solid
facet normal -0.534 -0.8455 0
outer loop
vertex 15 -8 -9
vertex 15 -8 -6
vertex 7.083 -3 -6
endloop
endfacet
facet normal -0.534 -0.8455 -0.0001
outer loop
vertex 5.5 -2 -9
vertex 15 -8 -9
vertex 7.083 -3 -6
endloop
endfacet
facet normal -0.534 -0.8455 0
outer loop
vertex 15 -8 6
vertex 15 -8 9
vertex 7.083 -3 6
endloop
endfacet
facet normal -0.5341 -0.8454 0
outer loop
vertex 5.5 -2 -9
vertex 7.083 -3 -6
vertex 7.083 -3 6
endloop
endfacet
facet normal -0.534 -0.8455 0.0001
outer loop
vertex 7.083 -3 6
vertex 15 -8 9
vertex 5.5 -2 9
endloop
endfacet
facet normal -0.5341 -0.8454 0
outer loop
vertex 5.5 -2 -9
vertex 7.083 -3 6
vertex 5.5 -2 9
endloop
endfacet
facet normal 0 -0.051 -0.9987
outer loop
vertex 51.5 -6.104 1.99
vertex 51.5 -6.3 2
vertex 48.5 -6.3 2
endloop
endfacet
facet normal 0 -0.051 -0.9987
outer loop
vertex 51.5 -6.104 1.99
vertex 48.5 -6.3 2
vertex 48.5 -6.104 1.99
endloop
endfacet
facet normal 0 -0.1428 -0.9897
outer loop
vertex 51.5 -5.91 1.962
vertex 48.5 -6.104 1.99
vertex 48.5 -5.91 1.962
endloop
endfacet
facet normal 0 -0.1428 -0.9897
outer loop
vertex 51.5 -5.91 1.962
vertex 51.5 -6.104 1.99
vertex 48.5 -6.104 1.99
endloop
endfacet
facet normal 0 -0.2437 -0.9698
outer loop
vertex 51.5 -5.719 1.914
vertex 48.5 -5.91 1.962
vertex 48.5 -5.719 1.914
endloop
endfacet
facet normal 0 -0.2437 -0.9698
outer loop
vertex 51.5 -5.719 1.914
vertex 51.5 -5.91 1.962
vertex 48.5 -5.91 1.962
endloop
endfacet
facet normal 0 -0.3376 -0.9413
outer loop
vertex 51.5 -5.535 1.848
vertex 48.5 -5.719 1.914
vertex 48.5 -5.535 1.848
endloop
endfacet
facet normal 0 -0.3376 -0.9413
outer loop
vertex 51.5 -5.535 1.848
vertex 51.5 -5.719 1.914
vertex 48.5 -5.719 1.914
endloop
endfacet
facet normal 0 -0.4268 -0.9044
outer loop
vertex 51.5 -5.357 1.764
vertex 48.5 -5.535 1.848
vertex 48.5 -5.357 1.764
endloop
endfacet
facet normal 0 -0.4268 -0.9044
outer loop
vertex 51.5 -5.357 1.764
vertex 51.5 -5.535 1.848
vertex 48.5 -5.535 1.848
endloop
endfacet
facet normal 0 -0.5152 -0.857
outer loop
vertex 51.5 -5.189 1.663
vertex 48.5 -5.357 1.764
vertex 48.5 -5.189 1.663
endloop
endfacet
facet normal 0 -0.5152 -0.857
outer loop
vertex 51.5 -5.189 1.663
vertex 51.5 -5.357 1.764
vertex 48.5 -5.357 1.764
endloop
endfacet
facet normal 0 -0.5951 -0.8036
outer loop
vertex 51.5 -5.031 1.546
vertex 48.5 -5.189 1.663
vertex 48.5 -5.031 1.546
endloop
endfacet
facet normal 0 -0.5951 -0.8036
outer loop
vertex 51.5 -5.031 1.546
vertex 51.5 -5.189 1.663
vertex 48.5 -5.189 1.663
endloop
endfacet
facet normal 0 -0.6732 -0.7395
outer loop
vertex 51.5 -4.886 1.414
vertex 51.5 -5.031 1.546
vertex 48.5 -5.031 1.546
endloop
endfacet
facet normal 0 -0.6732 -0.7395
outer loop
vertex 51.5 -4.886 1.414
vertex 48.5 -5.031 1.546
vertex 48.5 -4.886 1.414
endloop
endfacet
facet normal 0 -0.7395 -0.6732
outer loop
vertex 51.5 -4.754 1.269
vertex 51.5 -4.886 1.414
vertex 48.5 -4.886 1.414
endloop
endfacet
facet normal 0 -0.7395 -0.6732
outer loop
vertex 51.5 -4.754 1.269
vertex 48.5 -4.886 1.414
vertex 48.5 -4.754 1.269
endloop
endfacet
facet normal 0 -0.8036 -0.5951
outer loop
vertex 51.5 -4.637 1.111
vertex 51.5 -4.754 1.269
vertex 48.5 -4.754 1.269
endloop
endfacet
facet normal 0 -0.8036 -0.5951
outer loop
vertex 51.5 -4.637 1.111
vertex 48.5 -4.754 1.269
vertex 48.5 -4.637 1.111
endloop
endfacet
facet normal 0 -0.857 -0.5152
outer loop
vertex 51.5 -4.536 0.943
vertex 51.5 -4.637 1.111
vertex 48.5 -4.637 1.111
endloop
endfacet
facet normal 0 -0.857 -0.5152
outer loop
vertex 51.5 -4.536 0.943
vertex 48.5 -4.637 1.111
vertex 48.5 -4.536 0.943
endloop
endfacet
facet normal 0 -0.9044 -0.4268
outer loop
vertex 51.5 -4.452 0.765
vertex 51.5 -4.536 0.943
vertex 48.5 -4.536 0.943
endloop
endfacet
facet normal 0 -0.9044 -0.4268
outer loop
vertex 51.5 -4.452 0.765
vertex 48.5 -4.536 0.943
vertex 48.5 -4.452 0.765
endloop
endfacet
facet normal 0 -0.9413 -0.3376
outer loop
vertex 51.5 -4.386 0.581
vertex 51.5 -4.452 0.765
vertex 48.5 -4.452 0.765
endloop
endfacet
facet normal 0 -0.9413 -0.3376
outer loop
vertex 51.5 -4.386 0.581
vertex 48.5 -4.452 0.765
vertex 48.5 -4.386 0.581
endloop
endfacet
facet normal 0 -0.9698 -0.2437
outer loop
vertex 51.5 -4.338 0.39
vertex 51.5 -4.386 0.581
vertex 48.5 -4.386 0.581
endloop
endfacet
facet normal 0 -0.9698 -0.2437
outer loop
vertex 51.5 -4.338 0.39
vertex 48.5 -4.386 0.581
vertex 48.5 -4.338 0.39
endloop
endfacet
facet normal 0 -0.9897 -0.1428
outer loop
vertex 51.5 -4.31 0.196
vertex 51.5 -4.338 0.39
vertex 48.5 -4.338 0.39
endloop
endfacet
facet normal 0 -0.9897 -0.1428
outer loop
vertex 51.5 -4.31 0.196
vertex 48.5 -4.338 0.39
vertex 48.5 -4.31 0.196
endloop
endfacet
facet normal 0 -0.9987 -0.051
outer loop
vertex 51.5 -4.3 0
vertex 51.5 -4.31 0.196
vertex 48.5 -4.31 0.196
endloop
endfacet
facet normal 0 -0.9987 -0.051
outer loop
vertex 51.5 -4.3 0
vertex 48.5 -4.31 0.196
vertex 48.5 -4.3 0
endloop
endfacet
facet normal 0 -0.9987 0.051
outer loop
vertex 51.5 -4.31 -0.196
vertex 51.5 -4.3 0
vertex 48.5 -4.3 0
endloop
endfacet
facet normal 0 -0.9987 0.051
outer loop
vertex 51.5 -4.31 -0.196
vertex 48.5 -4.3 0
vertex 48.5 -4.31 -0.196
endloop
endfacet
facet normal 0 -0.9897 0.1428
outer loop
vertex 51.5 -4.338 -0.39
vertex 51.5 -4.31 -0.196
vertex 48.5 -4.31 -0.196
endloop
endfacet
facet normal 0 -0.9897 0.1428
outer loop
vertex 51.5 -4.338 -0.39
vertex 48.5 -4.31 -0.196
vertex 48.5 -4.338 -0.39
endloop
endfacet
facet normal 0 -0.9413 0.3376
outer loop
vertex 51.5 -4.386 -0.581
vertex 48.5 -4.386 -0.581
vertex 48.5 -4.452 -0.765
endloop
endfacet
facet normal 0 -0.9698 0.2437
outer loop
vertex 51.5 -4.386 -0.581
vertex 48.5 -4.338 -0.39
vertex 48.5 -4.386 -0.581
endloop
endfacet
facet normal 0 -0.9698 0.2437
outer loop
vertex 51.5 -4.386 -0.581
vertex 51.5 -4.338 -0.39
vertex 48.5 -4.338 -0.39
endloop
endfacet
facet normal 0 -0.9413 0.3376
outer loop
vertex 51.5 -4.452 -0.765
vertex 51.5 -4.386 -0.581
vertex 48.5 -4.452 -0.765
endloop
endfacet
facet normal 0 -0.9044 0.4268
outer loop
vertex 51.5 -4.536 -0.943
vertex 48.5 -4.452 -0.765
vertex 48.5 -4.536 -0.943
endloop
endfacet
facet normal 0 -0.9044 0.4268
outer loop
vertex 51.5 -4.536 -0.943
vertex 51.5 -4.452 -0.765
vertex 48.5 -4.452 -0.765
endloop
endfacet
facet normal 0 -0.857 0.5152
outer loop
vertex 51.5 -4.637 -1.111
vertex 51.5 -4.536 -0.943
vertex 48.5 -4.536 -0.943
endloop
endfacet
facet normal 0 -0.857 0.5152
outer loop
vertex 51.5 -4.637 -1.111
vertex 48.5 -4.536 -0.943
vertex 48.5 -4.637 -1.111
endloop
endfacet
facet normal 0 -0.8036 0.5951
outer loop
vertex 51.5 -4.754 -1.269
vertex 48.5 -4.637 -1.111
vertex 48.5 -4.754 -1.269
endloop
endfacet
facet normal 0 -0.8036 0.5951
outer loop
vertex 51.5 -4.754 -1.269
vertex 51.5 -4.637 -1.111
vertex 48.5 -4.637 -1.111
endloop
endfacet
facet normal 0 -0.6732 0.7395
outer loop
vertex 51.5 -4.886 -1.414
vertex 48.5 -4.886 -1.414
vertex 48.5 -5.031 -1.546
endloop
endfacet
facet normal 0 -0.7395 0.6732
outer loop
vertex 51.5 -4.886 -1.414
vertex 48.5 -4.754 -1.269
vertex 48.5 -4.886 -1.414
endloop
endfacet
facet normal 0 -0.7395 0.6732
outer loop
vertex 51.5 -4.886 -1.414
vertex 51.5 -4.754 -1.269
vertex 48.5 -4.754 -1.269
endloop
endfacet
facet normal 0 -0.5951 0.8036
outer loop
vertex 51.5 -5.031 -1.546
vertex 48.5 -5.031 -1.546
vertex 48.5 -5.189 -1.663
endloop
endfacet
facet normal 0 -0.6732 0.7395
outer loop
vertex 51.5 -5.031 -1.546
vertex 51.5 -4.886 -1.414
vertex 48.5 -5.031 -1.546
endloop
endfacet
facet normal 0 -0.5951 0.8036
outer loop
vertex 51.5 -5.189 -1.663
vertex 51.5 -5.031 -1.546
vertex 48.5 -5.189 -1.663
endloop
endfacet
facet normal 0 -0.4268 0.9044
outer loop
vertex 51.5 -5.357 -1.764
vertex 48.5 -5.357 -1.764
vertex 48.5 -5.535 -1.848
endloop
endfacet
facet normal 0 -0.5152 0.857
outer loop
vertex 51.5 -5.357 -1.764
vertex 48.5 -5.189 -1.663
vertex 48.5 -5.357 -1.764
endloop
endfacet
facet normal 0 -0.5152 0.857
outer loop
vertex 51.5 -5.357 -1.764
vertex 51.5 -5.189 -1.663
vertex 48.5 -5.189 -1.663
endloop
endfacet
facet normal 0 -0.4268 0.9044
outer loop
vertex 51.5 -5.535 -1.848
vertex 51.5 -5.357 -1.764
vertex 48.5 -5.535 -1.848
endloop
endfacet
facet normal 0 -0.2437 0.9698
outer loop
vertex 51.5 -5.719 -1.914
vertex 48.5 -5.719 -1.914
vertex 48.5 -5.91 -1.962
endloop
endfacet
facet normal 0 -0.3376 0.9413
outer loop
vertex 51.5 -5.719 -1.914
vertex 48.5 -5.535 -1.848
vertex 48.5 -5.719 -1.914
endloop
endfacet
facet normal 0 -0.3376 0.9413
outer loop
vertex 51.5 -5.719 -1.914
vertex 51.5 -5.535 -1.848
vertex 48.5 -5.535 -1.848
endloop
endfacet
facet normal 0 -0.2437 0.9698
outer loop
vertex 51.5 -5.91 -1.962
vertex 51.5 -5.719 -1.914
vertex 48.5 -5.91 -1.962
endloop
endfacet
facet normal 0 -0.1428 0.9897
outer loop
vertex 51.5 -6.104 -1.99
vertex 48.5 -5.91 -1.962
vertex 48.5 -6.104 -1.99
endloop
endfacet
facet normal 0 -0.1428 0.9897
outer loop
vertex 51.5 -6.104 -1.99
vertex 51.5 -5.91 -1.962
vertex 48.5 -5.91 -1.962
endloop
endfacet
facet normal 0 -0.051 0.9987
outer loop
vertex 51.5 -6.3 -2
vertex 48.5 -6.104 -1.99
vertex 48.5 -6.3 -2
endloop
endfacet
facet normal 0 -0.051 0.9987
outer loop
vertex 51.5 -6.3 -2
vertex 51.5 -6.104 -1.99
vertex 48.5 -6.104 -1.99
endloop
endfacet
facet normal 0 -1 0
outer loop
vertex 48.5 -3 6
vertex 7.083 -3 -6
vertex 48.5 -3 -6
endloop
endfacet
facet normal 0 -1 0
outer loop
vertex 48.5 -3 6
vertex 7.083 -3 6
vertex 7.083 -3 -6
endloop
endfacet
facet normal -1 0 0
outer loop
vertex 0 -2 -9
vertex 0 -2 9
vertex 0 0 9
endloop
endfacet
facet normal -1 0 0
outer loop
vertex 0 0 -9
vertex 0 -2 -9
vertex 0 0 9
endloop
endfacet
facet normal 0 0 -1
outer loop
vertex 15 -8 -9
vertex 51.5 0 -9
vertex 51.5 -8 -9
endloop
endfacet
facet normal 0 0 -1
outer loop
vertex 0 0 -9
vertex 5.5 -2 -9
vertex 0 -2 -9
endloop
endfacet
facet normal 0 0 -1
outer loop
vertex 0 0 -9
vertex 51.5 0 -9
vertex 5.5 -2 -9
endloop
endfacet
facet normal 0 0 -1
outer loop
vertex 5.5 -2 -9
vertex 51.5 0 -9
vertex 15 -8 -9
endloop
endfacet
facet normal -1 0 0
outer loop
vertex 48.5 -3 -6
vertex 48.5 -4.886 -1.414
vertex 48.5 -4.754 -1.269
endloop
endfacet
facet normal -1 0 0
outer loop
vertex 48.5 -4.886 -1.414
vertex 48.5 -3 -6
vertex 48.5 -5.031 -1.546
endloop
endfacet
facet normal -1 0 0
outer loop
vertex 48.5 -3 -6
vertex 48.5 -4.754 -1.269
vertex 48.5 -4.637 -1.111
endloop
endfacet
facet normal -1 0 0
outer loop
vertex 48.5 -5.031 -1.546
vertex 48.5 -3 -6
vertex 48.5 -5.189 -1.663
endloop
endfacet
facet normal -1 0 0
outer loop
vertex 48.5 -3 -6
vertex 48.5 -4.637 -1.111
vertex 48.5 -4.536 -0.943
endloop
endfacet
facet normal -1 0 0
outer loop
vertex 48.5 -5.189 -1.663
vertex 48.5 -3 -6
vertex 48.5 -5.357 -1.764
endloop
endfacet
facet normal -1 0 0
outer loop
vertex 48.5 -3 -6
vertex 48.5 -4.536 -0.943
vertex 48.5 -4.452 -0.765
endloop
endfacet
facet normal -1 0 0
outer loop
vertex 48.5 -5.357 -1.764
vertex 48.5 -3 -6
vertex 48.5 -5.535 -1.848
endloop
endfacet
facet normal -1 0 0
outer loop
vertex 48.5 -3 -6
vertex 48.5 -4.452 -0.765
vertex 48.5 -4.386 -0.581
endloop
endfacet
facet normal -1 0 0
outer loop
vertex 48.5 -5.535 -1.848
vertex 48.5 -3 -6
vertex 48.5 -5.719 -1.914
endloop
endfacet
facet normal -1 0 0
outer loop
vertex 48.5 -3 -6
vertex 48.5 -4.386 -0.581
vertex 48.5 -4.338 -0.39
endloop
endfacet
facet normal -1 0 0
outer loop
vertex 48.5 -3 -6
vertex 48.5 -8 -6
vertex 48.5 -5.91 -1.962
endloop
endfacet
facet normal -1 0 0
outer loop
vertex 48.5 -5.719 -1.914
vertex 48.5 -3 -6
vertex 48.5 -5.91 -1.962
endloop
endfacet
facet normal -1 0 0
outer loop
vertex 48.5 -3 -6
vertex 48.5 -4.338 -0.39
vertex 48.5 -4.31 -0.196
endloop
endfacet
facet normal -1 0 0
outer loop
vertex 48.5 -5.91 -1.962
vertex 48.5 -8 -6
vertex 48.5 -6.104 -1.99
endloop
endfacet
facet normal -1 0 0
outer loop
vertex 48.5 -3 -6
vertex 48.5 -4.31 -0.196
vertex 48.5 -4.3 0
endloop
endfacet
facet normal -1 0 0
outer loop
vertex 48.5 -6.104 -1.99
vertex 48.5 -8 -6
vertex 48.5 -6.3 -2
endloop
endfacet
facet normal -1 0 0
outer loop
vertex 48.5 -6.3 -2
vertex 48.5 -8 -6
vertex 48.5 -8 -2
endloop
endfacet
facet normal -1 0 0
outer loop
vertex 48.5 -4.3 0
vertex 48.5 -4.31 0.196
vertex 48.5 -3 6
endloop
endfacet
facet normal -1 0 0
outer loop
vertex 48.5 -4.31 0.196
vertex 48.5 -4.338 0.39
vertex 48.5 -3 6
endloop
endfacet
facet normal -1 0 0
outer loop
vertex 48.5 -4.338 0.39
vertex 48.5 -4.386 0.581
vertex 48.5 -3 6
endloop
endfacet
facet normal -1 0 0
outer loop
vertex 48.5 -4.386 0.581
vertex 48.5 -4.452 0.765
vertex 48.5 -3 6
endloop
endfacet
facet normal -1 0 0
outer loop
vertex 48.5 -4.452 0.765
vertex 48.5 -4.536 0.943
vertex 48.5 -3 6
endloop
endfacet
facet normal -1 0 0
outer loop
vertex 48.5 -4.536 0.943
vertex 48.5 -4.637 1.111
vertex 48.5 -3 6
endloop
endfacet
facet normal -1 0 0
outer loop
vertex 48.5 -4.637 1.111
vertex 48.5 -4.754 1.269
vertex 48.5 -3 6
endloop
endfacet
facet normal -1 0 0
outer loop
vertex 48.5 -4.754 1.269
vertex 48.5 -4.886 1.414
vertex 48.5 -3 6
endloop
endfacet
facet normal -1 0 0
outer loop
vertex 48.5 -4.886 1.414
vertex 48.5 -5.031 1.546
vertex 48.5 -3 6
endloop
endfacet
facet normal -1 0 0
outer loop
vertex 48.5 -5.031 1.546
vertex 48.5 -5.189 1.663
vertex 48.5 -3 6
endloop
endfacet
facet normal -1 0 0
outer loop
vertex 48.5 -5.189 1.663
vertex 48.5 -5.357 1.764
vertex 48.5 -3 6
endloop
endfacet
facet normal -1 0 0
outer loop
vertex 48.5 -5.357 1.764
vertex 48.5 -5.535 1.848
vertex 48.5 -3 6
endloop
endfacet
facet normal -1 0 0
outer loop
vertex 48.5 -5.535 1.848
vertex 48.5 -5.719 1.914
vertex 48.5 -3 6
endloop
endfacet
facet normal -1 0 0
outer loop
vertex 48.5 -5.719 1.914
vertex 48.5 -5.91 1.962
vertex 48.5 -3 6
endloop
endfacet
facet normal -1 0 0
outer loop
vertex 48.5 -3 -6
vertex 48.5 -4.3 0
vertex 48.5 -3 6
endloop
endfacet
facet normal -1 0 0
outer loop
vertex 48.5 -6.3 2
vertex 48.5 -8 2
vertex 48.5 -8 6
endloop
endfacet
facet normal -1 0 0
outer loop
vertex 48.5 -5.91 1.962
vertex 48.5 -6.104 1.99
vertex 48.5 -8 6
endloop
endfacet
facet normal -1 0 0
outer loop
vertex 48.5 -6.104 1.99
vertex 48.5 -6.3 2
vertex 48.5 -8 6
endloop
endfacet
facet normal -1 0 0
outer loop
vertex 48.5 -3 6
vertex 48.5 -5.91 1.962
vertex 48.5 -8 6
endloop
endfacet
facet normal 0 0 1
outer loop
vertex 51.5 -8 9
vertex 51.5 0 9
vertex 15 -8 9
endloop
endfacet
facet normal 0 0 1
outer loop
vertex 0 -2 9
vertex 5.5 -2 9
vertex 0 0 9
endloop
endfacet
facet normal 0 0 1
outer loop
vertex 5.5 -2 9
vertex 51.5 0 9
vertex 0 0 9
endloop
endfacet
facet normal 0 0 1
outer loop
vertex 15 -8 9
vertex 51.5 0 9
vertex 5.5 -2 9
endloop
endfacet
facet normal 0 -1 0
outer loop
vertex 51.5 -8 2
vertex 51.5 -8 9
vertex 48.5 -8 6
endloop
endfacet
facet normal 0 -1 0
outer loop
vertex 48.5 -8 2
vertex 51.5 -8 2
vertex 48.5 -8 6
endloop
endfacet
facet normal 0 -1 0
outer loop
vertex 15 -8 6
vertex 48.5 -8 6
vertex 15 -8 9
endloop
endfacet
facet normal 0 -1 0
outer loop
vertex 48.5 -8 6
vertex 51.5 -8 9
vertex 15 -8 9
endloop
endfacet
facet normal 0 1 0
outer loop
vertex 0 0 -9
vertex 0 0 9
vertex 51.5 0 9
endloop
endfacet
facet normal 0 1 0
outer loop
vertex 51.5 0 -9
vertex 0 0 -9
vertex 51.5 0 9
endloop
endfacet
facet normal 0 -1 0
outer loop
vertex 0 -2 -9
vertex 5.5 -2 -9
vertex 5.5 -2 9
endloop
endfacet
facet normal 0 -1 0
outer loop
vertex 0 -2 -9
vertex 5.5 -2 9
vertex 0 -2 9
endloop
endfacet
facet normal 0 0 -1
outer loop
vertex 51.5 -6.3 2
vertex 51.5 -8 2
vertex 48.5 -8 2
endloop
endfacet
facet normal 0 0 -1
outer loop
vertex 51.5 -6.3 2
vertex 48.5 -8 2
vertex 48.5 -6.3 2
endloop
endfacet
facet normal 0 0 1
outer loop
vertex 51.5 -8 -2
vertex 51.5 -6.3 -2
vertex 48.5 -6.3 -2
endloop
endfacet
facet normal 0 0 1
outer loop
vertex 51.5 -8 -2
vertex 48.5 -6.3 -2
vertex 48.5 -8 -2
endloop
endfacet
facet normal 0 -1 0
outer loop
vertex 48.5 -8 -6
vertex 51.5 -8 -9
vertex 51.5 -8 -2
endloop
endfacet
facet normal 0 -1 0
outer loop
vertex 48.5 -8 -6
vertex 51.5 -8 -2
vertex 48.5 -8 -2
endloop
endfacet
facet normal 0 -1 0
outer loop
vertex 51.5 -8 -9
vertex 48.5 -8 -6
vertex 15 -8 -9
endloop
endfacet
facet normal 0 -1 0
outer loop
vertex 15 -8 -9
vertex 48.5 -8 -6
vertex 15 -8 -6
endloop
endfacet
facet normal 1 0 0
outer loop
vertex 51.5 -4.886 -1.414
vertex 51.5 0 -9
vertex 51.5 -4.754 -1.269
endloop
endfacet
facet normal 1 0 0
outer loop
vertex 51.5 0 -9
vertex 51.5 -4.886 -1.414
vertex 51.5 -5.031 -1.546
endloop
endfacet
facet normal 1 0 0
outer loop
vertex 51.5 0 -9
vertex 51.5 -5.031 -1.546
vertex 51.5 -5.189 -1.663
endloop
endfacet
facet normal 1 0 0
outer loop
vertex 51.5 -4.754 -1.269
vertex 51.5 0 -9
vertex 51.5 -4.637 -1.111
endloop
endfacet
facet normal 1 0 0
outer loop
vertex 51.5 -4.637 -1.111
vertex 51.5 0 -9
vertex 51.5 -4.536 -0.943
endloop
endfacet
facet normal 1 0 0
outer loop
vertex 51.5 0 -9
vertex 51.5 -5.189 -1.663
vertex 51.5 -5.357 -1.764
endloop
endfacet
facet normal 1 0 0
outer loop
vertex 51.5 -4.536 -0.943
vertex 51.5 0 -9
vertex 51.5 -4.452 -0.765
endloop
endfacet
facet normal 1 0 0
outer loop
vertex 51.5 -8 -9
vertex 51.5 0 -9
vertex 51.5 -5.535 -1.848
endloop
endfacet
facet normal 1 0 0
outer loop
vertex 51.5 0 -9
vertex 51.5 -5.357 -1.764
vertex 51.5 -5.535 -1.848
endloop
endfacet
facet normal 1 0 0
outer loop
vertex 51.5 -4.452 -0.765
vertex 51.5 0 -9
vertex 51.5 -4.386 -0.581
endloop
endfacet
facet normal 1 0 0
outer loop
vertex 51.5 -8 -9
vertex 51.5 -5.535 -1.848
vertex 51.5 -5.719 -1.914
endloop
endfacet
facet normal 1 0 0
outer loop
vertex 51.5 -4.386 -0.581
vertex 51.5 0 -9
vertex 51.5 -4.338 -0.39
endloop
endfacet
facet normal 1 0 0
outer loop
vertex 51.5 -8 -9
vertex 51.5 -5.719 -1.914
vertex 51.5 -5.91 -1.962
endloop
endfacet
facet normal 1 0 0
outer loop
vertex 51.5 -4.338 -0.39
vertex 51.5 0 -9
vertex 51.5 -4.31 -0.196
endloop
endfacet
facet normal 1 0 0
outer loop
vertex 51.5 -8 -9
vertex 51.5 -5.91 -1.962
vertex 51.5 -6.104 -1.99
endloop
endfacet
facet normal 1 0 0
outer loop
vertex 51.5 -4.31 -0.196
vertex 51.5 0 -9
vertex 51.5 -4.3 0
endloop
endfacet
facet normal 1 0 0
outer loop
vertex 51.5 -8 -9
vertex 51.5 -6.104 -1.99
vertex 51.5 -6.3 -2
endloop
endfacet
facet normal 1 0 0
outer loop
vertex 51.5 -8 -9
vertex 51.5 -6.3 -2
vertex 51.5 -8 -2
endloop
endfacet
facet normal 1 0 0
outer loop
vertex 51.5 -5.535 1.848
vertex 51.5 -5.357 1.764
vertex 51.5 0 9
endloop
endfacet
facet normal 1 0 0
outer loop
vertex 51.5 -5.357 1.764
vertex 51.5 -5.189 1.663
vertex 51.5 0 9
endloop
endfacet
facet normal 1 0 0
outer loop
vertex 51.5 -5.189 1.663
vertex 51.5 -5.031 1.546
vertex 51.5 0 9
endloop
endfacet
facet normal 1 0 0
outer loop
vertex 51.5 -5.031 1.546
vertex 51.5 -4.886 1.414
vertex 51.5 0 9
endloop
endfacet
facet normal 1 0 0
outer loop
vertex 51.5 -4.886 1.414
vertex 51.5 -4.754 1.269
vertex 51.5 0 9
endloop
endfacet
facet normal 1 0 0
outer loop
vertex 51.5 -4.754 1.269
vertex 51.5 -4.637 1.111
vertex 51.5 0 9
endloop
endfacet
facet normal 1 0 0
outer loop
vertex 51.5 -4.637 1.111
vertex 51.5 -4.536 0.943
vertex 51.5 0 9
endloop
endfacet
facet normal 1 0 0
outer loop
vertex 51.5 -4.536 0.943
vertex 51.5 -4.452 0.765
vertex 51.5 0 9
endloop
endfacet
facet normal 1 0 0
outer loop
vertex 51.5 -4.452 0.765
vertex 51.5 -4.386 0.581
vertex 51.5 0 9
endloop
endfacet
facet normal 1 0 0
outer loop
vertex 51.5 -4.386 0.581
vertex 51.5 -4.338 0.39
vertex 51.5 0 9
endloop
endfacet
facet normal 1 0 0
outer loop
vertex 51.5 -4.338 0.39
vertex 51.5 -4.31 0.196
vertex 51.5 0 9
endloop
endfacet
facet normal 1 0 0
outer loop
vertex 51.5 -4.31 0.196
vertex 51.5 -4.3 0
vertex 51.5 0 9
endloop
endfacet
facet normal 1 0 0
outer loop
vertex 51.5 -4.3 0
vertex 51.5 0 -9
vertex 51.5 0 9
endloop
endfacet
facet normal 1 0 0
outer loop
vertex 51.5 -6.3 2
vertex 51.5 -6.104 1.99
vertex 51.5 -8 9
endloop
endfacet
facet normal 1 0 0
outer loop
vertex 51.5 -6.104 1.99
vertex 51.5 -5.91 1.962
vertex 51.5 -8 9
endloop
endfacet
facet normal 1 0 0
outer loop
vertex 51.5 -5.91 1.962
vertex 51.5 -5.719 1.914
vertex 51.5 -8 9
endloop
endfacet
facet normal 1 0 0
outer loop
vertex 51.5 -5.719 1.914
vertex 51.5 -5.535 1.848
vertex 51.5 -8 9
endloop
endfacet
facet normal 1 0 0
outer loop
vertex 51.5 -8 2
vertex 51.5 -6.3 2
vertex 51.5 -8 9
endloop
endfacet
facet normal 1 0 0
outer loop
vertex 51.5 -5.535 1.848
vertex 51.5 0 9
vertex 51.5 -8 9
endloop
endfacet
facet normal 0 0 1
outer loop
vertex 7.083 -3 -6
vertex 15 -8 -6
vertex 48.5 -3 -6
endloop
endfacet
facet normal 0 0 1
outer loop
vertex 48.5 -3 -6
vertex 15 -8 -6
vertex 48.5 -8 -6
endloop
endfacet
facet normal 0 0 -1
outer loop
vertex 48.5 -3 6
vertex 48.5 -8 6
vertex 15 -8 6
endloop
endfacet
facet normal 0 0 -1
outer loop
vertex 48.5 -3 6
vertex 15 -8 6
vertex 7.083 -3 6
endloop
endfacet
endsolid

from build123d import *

# Parameters (mm, degrees)
EXTRUDE_1_DEPTH     = 9
CUT_EXTRUDE_1_DEPTH = 5
CUT_EXTRUDE_2_REACH = 54.889


with BuildPart() as part:
    # 草图1 → 凸台-拉伸1 (new, symmetric)
    with BuildSketch(Plane.XY):
        Polygon((0, 0), (51.5, 0), (51.5, -8), (15, -8), (5.5, -2), (0, -2), align=None)
    extrude(amount=EXTRUDE_1_DEPTH, both=True)

    # 草图2 → 切除-拉伸1 (cut)
    with BuildSketch(Plane.XZ.offset(8)):
        Polygon((15, -6), (48.5, -6), (48.5, 6), (15, 6), (5.5, 6), (3, 6), (3, -6), (5.5, -6), align=None)
    extrude(amount=-CUT_EXTRUDE_1_DEPTH, mode=Mode.SUBTRACT)

    # 草图3 → 切除-拉伸2 (cut, up to next)
    with BuildSketch(Plane(origin=(51.5, 0, 0), x_dir=(0, 0, -1), z_dir=(1, 0, 0)), mode=Mode.PRIVATE) as cut_extrude_2_sk1:
        with BuildLine():
            Line((2, -6.3), (2, -8))
            Line((2, -8), (-2, -8))
            Line((-2, -8), (-2, -6.3))
            ThreePointArc((-2, -6.3), (0, -4.3), (2, -6.3))
        make_face()
    cut_extrude_2_tool1 = extrude(cut_extrude_2_sk1.sketch, amount=-CUT_EXTRUDE_2_REACH, mode=Mode.PRIVATE) & part.part
    add(cut_extrude_2_tool1.solids().sort_by_distance((51.5, -6.334141, 0))[0], mode=Mode.SUBTRACT)


solid = part.part
